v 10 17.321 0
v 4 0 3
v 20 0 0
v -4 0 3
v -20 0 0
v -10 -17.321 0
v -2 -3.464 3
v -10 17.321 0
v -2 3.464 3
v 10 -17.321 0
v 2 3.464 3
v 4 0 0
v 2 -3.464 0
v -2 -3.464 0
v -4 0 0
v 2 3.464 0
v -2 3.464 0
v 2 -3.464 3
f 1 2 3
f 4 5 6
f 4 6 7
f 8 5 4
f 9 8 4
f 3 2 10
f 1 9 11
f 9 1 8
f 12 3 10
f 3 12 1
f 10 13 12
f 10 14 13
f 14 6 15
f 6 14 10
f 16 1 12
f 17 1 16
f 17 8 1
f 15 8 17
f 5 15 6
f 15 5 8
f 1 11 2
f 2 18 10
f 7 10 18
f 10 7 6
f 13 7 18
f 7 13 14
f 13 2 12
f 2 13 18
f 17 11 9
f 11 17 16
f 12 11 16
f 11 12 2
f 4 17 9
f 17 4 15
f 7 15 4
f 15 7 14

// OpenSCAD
difference() {
	cylinder(r1=20, r2=4, h=3, $fn=6);
	cylinder(r=4, h=3, $fn=6);
}
